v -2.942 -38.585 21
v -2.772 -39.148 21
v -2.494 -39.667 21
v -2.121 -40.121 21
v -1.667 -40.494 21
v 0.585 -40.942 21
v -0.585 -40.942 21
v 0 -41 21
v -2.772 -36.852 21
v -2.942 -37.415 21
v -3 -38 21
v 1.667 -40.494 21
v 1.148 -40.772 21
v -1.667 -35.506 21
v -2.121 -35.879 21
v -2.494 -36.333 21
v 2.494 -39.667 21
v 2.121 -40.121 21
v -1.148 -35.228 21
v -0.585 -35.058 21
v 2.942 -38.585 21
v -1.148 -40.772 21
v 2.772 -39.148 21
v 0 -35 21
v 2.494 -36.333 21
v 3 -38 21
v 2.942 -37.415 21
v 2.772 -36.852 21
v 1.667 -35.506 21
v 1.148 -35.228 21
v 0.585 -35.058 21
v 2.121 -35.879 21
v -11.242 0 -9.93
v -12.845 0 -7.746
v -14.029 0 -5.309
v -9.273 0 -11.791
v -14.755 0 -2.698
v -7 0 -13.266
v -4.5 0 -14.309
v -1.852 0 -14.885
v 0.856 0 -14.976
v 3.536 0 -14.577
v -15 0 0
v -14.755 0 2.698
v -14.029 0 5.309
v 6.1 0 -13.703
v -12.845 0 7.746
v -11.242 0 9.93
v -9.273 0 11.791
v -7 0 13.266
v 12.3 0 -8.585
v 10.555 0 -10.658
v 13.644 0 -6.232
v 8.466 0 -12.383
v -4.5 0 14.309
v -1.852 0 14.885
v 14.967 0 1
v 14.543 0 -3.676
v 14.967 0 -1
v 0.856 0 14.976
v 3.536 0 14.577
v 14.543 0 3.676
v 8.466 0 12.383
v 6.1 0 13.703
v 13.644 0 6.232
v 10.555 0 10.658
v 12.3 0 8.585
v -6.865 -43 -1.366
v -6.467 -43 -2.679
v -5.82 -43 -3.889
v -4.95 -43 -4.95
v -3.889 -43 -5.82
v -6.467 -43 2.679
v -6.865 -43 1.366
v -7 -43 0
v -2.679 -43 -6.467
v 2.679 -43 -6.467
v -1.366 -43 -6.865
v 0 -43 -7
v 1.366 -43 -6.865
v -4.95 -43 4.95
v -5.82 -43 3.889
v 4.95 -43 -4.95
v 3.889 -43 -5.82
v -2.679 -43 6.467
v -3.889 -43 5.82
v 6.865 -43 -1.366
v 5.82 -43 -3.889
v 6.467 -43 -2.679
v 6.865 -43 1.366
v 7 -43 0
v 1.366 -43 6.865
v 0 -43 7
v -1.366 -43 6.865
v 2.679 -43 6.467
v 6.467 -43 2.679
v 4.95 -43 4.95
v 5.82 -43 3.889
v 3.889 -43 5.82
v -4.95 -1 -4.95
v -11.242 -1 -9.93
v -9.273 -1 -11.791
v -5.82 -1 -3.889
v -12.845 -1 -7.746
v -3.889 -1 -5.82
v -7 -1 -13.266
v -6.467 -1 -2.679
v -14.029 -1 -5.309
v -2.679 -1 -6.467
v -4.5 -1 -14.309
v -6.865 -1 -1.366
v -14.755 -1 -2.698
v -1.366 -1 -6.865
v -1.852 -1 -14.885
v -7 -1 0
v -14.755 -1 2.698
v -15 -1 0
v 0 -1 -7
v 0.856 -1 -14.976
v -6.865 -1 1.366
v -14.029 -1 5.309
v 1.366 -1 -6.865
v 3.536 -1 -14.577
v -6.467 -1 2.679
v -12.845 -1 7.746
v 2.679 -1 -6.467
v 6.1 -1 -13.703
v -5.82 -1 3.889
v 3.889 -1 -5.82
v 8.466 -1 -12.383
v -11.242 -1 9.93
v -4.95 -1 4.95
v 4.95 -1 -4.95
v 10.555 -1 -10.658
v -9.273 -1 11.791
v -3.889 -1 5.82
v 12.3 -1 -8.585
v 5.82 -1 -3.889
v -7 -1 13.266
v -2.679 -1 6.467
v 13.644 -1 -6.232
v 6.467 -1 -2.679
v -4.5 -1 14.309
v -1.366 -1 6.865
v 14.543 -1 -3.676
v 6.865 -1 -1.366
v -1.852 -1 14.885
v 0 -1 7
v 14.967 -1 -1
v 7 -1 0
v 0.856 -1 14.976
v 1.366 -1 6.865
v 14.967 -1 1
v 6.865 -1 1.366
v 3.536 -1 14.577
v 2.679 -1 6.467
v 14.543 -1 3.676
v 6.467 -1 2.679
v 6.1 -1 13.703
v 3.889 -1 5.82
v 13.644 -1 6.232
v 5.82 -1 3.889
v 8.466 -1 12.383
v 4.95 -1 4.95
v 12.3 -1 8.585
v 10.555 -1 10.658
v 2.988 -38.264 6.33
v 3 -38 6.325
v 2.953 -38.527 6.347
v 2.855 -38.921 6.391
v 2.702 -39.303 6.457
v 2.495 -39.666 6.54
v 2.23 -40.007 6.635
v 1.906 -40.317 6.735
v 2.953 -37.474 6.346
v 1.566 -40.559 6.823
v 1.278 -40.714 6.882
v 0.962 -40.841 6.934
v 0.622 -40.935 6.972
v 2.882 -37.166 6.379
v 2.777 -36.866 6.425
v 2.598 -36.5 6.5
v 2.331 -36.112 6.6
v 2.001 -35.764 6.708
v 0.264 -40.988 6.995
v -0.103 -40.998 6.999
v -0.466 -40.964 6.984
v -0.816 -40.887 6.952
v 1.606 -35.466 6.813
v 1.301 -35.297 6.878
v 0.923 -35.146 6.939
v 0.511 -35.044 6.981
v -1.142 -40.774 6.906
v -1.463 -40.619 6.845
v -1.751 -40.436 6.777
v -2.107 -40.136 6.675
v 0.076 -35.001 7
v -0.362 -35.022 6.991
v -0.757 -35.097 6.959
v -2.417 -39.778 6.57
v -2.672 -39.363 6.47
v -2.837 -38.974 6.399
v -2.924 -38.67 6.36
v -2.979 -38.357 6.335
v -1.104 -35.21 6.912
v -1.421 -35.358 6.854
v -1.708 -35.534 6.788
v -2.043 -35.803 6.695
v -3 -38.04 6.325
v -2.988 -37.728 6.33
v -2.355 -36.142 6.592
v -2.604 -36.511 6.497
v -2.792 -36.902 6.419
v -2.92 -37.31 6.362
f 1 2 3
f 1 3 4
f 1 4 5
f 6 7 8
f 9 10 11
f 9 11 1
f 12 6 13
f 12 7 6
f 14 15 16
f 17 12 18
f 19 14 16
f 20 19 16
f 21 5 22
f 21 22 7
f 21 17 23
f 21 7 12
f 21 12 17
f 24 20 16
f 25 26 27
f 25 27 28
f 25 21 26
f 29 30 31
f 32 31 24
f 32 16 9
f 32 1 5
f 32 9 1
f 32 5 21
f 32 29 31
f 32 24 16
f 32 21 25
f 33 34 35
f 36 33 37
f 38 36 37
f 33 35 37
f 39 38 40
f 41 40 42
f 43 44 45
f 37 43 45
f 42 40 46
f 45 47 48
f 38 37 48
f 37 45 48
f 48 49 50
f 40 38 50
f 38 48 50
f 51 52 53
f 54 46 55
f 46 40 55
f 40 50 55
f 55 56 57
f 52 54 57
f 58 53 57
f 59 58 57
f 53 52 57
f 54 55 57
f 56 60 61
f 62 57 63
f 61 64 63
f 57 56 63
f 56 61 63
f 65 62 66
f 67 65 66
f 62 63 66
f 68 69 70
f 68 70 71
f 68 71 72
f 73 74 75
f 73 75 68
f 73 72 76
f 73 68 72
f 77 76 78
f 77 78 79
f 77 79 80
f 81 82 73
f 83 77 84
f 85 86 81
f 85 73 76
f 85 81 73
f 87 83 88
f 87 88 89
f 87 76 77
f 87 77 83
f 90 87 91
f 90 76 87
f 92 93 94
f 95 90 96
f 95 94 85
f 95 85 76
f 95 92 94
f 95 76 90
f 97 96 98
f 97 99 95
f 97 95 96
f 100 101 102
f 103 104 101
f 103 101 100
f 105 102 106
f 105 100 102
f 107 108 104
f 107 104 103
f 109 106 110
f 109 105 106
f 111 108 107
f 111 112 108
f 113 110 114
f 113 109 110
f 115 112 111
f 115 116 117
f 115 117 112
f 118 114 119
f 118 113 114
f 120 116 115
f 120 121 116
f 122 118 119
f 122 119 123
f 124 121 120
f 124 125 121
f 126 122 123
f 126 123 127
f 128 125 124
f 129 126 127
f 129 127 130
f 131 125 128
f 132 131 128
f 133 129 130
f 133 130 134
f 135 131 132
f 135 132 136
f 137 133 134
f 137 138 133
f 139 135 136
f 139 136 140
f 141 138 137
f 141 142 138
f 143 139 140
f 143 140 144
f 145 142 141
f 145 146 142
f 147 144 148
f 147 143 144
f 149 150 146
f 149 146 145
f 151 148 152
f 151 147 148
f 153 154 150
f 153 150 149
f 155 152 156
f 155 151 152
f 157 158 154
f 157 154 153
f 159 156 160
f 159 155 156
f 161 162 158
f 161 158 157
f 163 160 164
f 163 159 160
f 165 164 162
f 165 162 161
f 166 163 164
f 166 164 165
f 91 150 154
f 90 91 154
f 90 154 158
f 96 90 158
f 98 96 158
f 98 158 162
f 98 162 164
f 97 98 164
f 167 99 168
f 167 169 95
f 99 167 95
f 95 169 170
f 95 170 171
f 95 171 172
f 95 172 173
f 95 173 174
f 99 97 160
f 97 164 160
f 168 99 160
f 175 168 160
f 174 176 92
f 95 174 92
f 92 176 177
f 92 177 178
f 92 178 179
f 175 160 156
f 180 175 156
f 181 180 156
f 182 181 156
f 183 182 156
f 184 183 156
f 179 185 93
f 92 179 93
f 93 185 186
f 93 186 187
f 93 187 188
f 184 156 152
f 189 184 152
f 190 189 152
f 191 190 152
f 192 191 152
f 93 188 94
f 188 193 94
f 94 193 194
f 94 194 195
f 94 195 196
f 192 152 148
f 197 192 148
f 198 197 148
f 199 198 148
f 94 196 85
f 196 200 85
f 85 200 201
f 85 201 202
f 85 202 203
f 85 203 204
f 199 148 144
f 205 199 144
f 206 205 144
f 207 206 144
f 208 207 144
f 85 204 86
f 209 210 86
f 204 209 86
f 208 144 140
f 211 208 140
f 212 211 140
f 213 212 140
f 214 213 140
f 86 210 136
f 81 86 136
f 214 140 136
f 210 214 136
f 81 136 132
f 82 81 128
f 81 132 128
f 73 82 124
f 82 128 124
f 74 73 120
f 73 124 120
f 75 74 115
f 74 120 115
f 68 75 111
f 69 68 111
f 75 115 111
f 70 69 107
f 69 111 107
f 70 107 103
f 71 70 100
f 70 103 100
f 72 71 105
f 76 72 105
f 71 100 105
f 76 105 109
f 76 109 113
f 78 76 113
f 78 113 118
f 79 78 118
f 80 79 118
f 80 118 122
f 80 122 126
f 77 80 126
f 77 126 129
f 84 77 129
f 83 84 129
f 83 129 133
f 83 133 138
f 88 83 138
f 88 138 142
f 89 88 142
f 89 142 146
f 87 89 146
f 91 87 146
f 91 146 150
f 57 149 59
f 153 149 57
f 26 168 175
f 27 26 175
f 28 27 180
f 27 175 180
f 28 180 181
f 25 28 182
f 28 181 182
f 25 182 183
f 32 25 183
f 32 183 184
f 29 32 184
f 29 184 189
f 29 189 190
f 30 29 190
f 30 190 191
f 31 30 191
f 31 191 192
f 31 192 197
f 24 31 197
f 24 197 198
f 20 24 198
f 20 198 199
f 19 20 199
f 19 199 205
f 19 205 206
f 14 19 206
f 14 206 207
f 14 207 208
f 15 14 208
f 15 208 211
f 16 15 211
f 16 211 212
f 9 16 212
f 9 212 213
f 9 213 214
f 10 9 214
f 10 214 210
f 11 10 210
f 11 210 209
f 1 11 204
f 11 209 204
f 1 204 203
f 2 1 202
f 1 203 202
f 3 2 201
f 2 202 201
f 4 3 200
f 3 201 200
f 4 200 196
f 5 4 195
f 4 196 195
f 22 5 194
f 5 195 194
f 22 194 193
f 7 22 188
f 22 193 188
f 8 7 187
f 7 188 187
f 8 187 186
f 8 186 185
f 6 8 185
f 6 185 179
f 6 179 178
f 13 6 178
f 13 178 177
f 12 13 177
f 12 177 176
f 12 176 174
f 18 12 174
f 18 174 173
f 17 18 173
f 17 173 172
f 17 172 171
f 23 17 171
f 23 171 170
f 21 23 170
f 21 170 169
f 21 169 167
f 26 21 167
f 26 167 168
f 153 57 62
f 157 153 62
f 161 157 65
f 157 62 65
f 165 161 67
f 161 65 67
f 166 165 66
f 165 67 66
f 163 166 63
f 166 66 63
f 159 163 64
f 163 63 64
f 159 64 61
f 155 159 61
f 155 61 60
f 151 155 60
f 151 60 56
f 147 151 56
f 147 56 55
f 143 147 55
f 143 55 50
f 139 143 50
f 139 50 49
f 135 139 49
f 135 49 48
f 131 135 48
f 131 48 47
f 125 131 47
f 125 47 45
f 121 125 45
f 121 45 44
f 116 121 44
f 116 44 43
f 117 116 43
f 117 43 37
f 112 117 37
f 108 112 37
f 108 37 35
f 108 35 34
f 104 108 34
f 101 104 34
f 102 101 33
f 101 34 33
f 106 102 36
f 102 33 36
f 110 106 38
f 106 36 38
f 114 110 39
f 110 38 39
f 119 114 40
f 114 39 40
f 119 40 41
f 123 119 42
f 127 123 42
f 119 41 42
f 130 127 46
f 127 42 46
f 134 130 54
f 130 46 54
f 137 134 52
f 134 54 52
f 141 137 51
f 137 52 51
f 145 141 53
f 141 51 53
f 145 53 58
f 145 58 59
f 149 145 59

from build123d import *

# Parameters (mm, degrees)
F0_R     = 15
F1_DEPTH = 1
F2_R     = 7
F3_DEPTH = 42
F4_R     = 3
F5_DEPTH = 21
F6_W     = 2
F6_H     = 2
F7_DEPTH = 1.001


with BuildPart() as f1:
    # F0 (on Front) → F1 (new body)
    with BuildSketch(Plane.XZ):
        Circle(F0_R)
    extrude(amount=F1_DEPTH)

    # F2 (on face) → F3 (join)
    with BuildSketch(Plane.XZ.offset(1)):
        Circle(F2_R)
    extrude(amount=F3_DEPTH)

    # F4 (on Top) → F5 (join)
    with BuildSketch(Plane.XY):
        with Locations((0, -38)):
            Circle(F4_R)
    extrude(amount=F5_DEPTH)

    # F6 (on face) → F7 (cut, through all)
    with BuildSketch(Plane.XZ.offset(1)):
        with Locations((15.96663, 0)):
            Rectangle(F6_W, F6_H)
    extrude(amount=-F7_DEPTH, mode=Mode.SUBTRACT)


solid = f1.part
